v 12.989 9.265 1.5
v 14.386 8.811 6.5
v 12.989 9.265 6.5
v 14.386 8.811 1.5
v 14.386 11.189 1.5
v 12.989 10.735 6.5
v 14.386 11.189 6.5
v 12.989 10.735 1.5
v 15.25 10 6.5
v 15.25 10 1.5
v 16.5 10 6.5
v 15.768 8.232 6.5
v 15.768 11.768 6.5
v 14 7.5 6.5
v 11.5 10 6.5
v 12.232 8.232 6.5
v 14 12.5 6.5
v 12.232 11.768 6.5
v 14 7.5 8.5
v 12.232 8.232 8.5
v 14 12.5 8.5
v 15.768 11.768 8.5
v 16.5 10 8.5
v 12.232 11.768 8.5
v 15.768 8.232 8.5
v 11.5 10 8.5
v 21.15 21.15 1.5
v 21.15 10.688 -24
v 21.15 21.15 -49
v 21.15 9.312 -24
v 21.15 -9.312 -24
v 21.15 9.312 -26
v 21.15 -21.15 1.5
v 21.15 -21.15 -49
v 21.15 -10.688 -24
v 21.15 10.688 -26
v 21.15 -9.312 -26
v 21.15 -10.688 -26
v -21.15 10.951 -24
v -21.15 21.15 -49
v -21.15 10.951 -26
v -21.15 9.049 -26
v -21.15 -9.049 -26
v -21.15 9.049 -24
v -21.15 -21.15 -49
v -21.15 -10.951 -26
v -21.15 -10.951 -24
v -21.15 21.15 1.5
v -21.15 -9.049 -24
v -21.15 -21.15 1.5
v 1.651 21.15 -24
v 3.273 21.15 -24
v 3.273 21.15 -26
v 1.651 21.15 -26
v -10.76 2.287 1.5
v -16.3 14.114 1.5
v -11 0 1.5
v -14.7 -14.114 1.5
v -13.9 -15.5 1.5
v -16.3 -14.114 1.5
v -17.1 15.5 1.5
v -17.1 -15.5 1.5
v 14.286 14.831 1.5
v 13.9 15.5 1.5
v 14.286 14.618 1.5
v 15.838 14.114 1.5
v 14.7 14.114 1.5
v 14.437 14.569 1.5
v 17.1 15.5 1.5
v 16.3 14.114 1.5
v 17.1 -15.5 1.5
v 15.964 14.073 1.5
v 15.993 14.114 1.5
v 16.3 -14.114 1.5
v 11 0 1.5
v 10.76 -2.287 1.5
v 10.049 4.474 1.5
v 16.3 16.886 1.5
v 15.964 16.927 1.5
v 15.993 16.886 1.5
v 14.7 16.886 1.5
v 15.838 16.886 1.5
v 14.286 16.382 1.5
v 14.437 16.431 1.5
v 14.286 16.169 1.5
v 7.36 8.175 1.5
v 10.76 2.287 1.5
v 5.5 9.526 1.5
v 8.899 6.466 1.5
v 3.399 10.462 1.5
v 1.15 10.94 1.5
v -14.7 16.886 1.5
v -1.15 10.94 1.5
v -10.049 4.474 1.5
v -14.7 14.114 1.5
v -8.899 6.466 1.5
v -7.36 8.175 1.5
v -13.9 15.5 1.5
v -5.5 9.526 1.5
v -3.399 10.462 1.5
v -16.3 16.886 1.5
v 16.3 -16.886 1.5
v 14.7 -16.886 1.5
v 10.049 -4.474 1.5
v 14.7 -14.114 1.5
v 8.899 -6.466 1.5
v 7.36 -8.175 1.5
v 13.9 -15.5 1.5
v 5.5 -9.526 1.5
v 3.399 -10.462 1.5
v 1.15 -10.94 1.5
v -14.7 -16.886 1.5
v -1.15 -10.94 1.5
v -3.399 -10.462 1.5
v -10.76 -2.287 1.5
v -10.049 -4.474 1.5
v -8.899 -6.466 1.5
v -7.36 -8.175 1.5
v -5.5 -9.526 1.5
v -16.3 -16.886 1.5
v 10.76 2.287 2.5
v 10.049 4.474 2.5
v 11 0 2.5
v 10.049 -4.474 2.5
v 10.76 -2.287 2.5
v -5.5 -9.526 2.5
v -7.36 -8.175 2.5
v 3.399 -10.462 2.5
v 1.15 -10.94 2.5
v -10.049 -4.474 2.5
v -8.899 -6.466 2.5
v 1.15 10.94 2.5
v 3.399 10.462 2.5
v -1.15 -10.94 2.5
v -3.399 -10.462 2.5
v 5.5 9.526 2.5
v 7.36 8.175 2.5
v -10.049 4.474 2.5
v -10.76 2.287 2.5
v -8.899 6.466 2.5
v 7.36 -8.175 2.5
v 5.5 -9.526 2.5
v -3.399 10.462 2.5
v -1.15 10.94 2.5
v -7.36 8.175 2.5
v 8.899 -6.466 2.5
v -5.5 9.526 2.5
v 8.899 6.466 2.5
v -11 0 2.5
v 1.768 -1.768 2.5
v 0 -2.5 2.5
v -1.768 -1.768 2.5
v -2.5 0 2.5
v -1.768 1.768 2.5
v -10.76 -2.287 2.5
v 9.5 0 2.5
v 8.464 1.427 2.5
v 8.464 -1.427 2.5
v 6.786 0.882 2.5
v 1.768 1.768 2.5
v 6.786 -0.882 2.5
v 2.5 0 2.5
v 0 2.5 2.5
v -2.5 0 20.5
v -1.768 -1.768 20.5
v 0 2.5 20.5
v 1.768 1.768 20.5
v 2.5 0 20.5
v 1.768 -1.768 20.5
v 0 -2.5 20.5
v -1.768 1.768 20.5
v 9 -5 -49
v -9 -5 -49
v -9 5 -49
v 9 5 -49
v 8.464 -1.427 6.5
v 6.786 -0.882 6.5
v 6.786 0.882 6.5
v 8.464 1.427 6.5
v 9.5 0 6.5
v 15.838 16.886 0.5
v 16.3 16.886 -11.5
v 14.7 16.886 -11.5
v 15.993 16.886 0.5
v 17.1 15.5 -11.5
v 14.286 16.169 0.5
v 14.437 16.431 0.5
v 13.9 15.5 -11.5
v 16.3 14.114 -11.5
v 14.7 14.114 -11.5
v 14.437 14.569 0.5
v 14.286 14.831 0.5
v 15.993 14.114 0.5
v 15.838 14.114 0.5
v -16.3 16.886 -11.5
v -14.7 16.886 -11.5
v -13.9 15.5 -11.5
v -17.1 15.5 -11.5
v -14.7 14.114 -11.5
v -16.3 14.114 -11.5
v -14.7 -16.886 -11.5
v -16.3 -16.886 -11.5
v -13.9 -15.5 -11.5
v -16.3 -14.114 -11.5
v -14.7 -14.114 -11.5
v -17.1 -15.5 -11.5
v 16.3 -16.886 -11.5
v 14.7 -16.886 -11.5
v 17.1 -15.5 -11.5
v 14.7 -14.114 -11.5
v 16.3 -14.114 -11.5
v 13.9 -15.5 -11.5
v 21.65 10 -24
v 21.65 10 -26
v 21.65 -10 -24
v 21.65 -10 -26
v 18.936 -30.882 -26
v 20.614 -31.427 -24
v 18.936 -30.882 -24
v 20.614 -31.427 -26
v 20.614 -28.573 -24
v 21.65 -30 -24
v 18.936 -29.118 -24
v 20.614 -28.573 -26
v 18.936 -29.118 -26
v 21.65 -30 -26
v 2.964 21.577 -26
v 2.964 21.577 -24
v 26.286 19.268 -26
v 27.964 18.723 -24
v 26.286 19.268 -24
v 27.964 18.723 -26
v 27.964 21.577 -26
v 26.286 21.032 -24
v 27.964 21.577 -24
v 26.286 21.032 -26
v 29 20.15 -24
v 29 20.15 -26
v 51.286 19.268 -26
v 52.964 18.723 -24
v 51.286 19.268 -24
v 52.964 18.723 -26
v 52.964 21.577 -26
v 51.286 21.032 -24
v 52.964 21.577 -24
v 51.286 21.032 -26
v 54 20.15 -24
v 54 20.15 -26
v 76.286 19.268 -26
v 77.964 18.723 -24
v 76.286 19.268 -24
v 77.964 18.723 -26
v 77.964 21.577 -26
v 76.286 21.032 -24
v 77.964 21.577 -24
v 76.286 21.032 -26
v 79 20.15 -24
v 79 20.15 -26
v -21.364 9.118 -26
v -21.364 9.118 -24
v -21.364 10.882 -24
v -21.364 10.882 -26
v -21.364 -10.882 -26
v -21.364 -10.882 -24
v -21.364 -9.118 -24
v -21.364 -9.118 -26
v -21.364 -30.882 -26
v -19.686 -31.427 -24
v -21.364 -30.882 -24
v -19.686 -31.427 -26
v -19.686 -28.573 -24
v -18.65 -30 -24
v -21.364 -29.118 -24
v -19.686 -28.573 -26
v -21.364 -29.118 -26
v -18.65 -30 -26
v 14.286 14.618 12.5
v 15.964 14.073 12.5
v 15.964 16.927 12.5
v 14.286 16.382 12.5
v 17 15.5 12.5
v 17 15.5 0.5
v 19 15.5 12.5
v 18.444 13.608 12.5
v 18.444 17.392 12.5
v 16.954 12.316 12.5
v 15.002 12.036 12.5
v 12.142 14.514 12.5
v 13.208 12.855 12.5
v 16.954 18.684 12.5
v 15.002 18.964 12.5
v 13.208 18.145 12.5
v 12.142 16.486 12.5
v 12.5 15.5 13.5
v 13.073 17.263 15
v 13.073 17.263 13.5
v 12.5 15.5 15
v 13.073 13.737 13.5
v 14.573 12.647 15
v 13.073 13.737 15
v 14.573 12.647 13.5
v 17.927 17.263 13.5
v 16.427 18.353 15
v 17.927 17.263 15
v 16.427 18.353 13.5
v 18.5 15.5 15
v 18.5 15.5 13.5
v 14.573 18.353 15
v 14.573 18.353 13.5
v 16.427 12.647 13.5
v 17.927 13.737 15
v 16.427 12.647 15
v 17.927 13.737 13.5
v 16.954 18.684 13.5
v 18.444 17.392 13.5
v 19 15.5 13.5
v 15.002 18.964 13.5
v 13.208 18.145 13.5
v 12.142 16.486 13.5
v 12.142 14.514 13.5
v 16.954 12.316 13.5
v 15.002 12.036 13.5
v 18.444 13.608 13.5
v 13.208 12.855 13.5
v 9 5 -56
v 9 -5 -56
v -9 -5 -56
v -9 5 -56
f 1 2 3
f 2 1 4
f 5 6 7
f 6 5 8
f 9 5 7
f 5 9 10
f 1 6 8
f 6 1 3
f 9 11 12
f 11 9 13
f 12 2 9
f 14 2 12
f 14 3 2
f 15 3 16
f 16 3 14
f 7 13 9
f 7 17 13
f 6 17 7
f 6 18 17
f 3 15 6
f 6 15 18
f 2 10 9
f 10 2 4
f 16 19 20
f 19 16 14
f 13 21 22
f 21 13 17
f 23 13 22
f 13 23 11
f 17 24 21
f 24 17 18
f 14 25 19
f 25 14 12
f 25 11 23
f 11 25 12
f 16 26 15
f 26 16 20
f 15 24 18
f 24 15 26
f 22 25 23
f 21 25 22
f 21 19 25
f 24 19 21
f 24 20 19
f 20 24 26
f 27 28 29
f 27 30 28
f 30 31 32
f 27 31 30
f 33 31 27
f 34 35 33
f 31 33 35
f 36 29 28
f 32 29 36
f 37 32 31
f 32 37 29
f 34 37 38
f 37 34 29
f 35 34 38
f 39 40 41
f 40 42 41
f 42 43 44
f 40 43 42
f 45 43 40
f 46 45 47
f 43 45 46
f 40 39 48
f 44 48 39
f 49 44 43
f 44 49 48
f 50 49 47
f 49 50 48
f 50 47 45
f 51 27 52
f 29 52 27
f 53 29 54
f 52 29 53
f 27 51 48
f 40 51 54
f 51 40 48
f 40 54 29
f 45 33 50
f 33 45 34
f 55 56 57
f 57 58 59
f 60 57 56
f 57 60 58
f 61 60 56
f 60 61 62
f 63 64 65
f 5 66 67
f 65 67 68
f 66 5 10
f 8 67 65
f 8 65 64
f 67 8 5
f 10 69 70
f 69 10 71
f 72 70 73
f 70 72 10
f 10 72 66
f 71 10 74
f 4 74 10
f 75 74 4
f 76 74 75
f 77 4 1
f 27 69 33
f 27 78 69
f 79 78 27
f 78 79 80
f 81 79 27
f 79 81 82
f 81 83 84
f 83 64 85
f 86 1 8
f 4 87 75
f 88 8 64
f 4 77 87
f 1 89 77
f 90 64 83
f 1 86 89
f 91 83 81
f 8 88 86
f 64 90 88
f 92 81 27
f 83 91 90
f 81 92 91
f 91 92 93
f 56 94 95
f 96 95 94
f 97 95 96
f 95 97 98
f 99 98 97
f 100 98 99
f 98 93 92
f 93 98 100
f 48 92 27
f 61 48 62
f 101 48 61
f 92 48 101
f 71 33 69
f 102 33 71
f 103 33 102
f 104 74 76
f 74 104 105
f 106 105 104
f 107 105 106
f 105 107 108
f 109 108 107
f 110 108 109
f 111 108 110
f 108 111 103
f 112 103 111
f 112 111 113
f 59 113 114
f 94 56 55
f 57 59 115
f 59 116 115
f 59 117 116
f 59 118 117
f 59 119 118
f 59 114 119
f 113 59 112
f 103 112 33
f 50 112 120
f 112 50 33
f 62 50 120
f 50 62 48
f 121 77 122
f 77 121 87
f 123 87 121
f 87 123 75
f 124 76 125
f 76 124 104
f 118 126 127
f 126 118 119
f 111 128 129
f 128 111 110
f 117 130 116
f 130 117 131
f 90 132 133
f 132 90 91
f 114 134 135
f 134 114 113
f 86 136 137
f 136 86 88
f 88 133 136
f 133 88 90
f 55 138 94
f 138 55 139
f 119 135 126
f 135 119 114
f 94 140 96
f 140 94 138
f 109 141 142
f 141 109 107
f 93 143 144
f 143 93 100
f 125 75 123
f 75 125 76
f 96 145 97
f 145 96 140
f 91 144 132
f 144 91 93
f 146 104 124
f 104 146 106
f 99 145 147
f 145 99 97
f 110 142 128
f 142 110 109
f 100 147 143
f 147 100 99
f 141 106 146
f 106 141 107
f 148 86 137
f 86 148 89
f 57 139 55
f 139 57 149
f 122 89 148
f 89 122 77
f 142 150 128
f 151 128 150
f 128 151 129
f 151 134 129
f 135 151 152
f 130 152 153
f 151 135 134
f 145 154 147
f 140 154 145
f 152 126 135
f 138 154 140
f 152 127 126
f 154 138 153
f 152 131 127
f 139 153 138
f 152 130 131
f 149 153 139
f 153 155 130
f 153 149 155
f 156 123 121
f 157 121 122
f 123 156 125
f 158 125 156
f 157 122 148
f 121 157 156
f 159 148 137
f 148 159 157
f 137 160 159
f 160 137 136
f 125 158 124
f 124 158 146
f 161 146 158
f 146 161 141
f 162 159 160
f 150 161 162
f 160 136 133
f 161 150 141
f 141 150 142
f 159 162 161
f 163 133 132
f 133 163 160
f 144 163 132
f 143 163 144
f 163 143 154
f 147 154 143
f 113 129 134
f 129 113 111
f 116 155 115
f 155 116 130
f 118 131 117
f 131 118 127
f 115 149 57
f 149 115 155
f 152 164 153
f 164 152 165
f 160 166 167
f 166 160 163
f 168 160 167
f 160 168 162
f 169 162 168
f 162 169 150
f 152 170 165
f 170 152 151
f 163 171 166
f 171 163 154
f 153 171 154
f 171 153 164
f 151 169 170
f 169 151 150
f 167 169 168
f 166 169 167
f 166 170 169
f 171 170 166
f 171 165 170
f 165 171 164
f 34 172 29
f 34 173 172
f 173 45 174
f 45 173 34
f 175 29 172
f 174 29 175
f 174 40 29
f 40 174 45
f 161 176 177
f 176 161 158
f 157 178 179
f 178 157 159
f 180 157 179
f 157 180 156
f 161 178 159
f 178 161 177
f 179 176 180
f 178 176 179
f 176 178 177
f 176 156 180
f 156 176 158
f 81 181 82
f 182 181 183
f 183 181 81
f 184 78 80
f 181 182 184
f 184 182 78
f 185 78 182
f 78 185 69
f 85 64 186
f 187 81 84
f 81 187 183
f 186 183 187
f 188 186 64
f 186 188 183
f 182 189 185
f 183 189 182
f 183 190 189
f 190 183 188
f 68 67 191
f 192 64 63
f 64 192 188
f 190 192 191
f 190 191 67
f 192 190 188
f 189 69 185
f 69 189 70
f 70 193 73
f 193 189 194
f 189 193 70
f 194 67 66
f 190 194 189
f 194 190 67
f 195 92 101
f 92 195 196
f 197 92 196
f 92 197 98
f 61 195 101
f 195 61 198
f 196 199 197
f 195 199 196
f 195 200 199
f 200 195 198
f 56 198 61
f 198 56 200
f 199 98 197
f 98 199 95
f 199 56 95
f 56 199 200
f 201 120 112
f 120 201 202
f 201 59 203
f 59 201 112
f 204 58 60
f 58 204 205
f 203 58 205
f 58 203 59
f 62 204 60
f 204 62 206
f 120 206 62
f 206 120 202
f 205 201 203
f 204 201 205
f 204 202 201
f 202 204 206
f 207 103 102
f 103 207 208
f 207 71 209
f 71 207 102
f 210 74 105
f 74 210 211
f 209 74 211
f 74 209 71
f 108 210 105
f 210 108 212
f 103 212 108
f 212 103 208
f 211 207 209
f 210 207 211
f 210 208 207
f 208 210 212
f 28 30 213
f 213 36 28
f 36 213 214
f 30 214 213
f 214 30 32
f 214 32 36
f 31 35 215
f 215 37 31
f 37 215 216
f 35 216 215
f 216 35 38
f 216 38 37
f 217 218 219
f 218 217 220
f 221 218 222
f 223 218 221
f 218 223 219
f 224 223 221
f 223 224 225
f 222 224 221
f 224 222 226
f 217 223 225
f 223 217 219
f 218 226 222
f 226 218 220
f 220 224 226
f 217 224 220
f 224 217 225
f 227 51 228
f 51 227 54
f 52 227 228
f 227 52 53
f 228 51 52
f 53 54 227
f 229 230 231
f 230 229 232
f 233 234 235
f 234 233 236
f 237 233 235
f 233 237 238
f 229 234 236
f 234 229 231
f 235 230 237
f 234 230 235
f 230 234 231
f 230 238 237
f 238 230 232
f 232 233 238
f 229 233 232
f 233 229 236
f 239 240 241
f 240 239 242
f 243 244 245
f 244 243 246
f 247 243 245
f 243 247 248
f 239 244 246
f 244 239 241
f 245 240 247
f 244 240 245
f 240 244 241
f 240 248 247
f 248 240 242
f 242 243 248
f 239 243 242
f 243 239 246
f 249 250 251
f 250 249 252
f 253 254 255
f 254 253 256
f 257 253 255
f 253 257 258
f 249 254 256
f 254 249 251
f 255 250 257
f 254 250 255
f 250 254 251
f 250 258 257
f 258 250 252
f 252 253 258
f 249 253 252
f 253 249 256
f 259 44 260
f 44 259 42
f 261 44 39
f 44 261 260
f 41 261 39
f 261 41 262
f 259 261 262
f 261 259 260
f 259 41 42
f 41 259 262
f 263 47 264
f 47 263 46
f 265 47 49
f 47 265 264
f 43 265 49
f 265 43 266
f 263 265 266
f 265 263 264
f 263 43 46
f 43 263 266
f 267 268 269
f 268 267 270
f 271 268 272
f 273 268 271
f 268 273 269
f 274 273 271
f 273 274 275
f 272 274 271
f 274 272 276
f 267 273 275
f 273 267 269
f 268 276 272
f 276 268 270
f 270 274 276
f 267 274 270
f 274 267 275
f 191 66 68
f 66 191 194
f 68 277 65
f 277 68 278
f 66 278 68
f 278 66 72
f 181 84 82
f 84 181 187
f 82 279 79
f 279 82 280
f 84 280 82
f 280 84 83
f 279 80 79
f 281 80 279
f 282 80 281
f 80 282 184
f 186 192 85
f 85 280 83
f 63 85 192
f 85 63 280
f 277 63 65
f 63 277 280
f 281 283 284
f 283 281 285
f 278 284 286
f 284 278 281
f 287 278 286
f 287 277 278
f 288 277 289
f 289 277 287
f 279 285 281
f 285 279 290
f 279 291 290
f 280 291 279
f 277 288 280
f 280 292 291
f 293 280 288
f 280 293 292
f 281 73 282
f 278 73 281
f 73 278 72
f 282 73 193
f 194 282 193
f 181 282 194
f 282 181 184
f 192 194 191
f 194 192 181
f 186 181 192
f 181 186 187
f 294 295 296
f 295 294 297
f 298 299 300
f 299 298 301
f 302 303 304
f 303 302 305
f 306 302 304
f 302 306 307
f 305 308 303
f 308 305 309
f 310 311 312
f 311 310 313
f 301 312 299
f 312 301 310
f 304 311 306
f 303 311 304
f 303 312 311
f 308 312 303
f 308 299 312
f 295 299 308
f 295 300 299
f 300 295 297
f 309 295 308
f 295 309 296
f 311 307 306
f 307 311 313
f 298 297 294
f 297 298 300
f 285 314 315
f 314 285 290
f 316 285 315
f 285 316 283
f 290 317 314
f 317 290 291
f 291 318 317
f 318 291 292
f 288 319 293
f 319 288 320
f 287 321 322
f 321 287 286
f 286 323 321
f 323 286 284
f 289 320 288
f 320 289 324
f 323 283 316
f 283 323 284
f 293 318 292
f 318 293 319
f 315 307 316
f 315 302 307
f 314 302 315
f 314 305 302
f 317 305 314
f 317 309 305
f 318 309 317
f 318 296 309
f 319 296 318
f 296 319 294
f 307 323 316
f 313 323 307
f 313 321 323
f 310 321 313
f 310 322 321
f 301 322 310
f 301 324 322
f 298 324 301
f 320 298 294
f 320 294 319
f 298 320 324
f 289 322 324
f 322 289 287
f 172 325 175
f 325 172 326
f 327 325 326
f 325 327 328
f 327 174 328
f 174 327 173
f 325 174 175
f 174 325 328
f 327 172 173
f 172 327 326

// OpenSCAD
// Parameters
face_width = 42.3; //[21.15:84.6:0.1]
face_thickness = 3.0; //[1.5:6.0:0.1]
body_length = 47.0; //[23.5:94.0:0.1]
body_width = 42.3; //[21.15:84.6:0.1]
body_height = 42.3; //[21.15:84.6:0.1]
corner_radius = 2.0; //[1.0:4.0:0.1]
shaft_diameter = 5.0; //[2.5:10.0:0.1]
shaft_length = 20.0; //[10.0:40.0:0.1]
front_boss_diameter = 22.0; //[11.0:44.0:0.1]
front_boss_height = 2.0; //[1.0:6.0:0.1]
mount_hole_spacing = 31.0; //[15.5:62.0:0.1]
mount_hole_diameter = 3.2; //[1.6:6.4:0.1]
rear_cap_thickness = 2.5; //[1.0:6.0:0.1]
eps_overlap = 1.0; //[0.5:2.0:0.1]
mount_hole_depth = 10.0; //[5.0:25.0:0.1]
ttrack_length = 60.0; //[30.0:120.0:0.5]
ttrack_pitch = 20.0; //[10.0:40.0:0.5]
ttrack_height = 12.0; //[6.0:24.0:0.5]
ttrack_slot_height = 6.0; //[3.0:12.0:0.5]
ttrack_top_thickness = 2.0; //[1.0:4.0:0.1]
rail_length = 80.0; //[40.0:160.0:0.5]
rail_pitch = 25.0; //[10.0:50.0:0.5]
rail_hole_count = 4.0; //[2.0:10.0:1.0]
helper_hole_diameter = 3.0; //[1.5:6.0:0.1]
helper_marker_height = 2.0; //[1.0:6.0:0.1]
screw_shank_diameter = 3.0; //[1.5:6.0:0.1]
screw_length = 12.0; //[6.0:30.0:0.5]
screw_head_diameter = 6.0; //[3.0:12.0:0.1]
screw_head_height = 2.5; //[1.0:6.0:0.1]
washer_outer_diameter = 7.0; //[3.5:14.0:0.1]
washer_thickness = 1.0; //[0.5:3.0:0.1]
d_plug_width = 18.0; //[9.0:36.0:0.5]
d_plug_height = 10.0; //[5.0:20.0:0.5]
d_plug_depth = 8.0; //[4.0:16.0:0.5]
internal_anchor_size = 6.0; //[3.0:12.0:0.5]

// --- Top pin/connector parameters (peg/pin near shaft side) ---
top_pin_diameter = 3.0;
top_pin_height   = 8.0;
top_pin_x_offset = 8.0;   // right side of top face (+X)
top_pin_y_offset = 0.0;

// --- Small screw/bolt-like fastener near shaft side (top) ---
top_screw_shank_diameter = 2.5;
top_screw_length         = 8.0;
top_screw_head_diameter  = 5.0;
top_screw_head_height    = 2.0;
top_screw_x_offset       = 14.0;  // near shaft side (+X)
top_screw_y_offset       = 10.0;  // slightly toward +Y

// ---------- Derived Z reference planes (reused to guarantee attachment) ----------
front_face_z      = 0;
front_face_top_z  = front_face_z + face_thickness/2;
front_face_bot_z  = front_face_z - face_thickness/2;

// Body is placed behind the front face; its front is slightly overlapped into the face
body_center_z     = -(face_thickness/2 + body_length/2 - eps_overlap);
body_front_z      = body_center_z + body_length/2;  // should be -face_thickness/2 + eps_overlap
body_back_z       = body_center_z - body_length/2;

// Modules
module motor_body() {
  color("Black")
    translate([0, 0, body_center_z])
      cube([body_width, body_height, body_length], center=true);
}

module front_face() {
  color("Black")
    translate([0, 0, front_face_z])
      cube([face_width, face_width, face_thickness], center=true);
}

module front_boss_or_register() {
  color("Silver")
    translate([0, 0, front_face_top_z + front_boss_height/2 - eps_overlap])
      cylinder(r=front_boss_diameter/2, h=front_boss_height, center=true);
}

module output_shaft() {
  color("Silver")
    translate([0, 0, front_face_top_z + shaft_length/2 - eps_overlap])
      cylinder(r=shaft_diameter/2, h=shaft_length, center=true);
}

module rear_cap_face() {
  color("Black")
    // Rear cap sits behind the body and overlaps slightly into it
    translate([0, 0, body_back_z - rear_cap_thickness/2 + eps_overlap])
      cube([body_width, body_height, rear_cap_thickness], center=true);
}

module mounting_holes_pattern() {
  color("DimGray")
    union() {
      translate([ mount_hole_spacing/2,  mount_hole_spacing/2, -(mount_hole_depth/2 - eps_overlap)])
        cylinder(r=mount_hole_diameter/2, h=mount_hole_depth + face_thickness + eps_overlap*2, center=true);
      translate([-mount_hole_spacing/2,  mount_hole_spacing/2, -(mount_hole_depth/2 - eps_overlap)])
        cylinder(r=mount_hole_diameter/2, h=mount_hole_depth + face_thickness + eps_overlap*2, center=true);
      translate([-mount_hole_spacing/2, -mount_hole_spacing/2, -(mount_hole_depth/2 - eps_overlap)])
        cylinder(r=mount_hole_diameter/2, h=mount_hole_depth + face_thickness + eps_overlap*2, center=true);
      translate([ mount_hole_spacing/2, -mount_hole_spacing/2, -(mount_hole_depth/2 - eps_overlap)])
        cylinder(r=mount_hole_diameter/2, h=mount_hole_depth + face_thickness + eps_overlap*2, center=true);
    }
}

// --- FIX: Peg/pin is now attached to the TOP of the motor body with overlap ---
module top_pin_connector() {
  // Attach to top of body (+Z of body): z = body_front_z + top_pin_height/2 - eps_overlap
  // (body_front_z is the body's front plane; using it ensures consistent attachment)
  color("Silver")
    translate([top_pin_x_offset, top_pin_y_offset, body_front_z + top_pin_height/2 - eps_overlap])
      cylinder(r=top_pin_diameter/2, h=top_pin_height, center=true);
}

// --- FIX: Small screw/bolt-like fastener is now created and attached to the TOP of the motor body ---
module top_screw_fastener() {
  // Shank overlaps into the body by eps_overlap to guarantee union connectivity
  shank_z = body_front_z + top_screw_length/2 - eps_overlap;
  head_z  = body_front_z + top_screw_length - eps_overlap + top_screw_head_height/2;

  color("Silver")
    union() {
      translate([top_screw_x_offset, top_screw_y_offset, shank_z])
        cylinder(r=top_screw_shank_diameter/2, h=top_screw_length, center=true);
      translate([top_screw_x_offset, top_screw_y_offset, head_z])
        cylinder(r=top_screw_head_diameter/2, h=top_screw_head_height, center=true);
    }
}

module motor_with_mount_holes() {
  difference() {
    union() {
      motor_body();
      front_face();
      front_boss_or_register();
      output_shaft();
      rear_cap_face();

      // FIXED: both previously floating parts are now included and physically intersect the body
      top_pin_connector();
      top_screw_fastener();
    }
    mounting_holes_pattern();
  }
}

module ttrack_hole_positions() {
  color("Blue")
    union() {
      translate([body_width/2 - eps_overlap,
                 ttrack_length/2 - ((ttrack_length - floor(ttrack_length/ttrack_pitch)*ttrack_pitch)/2 + ttrack_pitch),
                 -(face_thickness/2 + body_length/2)])
        cylinder(r=helper_hole_diameter/2, h=helper_marker_height, center=true);
      translate([body_width/2 - eps_overlap,
                 ttrack_length/2 - ((ttrack_length - floor(ttrack_length/ttrack_pitch)*ttrack_pitch)/2 + ttrack_pitch*2),
                 -(face_thickness/2 + body_length/2)])
        cylinder(r=helper_hole_diameter/2, h=helper_marker_height, center=true);
      translate([body_width/2 - eps_overlap,
                 ttrack_length/2 - ((ttrack_length - floor(ttrack_length/ttrack_pitch)*ttrack_pitch)/2 + ttrack_pitch*3),
                 -(face_thickness/2 + body_length/2)])
        cylinder(r=helper_hole_diameter/2, h=helper_marker_height, center=true);
    }
}

module rail_hole_positions() {
  color("Green")
    union() {
      translate([rail_length/2 - (rail_pitch*(rail_hole_count-1))/2,
                 body_height/2 - eps_overlap,
                 -(face_thickness/2 + body_length/2)])
        cylinder(r=helper_hole_diameter/2, h=helper_marker_height, center=true);
      translate([rail_length/2 - (rail_pitch*(rail_hole_count-1))/2 + rail_pitch,
                 body_height/2 - eps_overlap,
                 -(face_thickness/2 + body_length/2)])
        cylinder(r=helper_hole_diameter/2, h=helper_marker_height, center=true);
      translate([rail_length/2 - (rail_pitch*(rail_hole_count-1))/2 + rail_pitch*2,
                 body_height/2 - eps_overlap,
                 -(face_thickness/2 + body_length/2)])
        cylinder(r=helper_hole_diameter/2, h=helper_marker_height, center=true);
      translate([rail_length/2 - (rail_pitch*(rail_hole_count-1))/2 + rail_pitch*3,
                 body_height/2 - eps_overlap,
                 -(face_thickness/2 + body_length/2)])
        cylinder(r=helper_hole_diameter/2, h=helper_marker_height, center=true);
    }
}

module ttrack_insert_hole_positions() {
  color("Red")
    union() {
      translate([-(body_width/2 - eps_overlap),
                 ttrack_length/2 - ((ttrack_length - floor(ttrack_length/ttrack_pitch)*ttrack_pitch)/2 + ttrack_pitch),
                 -(face_thickness/2 + body_length/2)])
        cylinder(r=helper_hole_diameter/2, h=helper_marker_height, center=true);
      translate([-(body_width/2 - eps_overlap),
                 ttrack_length/2 - ((ttrack_length - floor(ttrack_length/ttrack_pitch)*ttrack_pitch)/2 + ttrack_pitch*2),
                 -(face_thickness/2 + body_length/2)])
        cylinder(r=helper_hole_diameter/2, h=helper_marker_height, center=true);
      translate([-(body_width/2 - eps_overlap),
                 ttrack_length/2 - ((ttrack_length - floor(ttrack_length/ttrack_pitch)*ttrack_pitch)/2 + ttrack_pitch*3),
                 -(face_thickness/2 + body_length/2)])
        cylinder(r=helper_hole_diameter/2, h=helper_marker_height, center=true);
    }
}

module screw_and_washer() {
  // Keep as helper marker geometry; ensure it intersects the front face slightly
  color("Silver")
    union() {
      translate([mount_hole_spacing/2, mount_hole_spacing/2, front_face_top_z + screw_length/2 - eps_overlap])
        cylinder(r=screw_shank_diameter/2, h=screw_length, center=true);
      translate([mount_hole_spacing/2, mount_hole_spacing/2, front_face_top_z + screw_length - eps_overlap + screw_head_height/2])
        cylinder(r=screw_head_diameter/2, h=screw_head_height, center=true);
      translate([mount_hole_spacing/2, mount_hole_spacing/2, front_face_top_z + screw_length - eps_overlap + washer_thickness/2])
        cylinder(r=washer_outer_diameter/2, h=washer_thickness, center=true);
    }
}

module d_plug_D() {
  // Keep as helper marker geometry; positioned behind rear cap with slight overlap into it
  color("Yellow")
    translate([0, 0, (body_back_z - rear_cap_thickness + eps_overlap) - d_plug_depth/2 + eps_overlap])
      cube([d_plug_width, d_plug_height, d_plug_depth], center=true);
}

module internal_anchor() {
  color("Gray")
    translate([0, 0, -(face_thickness/2 + body_length/2)])
      cube([internal_anchor_size, internal_anchor_size, internal_anchor_size], center=true);
}

module helpers_union() {
  union() {
    internal_anchor();
    ttrack_hole_positions();
    rail_hole_positions();
    ttrack_insert_hole_positions();
    screw_and_washer();
    d_plug_D();
  }
}

module assembly() {
  union() {
    motor_with_mount_holes();
    helpers_union();
  }
}

assembly();
